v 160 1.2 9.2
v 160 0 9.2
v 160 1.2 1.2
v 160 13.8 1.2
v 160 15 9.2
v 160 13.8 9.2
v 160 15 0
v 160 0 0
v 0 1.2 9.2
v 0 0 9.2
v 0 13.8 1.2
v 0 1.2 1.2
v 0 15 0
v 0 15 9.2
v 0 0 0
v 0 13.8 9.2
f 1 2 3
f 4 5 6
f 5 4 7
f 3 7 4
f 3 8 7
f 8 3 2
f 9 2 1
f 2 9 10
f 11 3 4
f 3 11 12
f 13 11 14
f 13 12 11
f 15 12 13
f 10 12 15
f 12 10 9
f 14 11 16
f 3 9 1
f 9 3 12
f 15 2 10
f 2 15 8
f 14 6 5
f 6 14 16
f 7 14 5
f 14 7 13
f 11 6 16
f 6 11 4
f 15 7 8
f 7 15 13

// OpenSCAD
// ScienceClaw nominal U-channel. All dimensions in millimeters.
// Clamp the first clamp_length along x. No holes or clamp reinforcement.
// Print parameters, layer orientation, material batch, and actual dimensions
// must be recorded separately; this file does not prescribe a qualified process.
length = 160;
clamp_length = 25;
base_width = 15;
wall_height = 8;
thickness = 1.2;
assert(length > clamp_length && clamp_length > 0);
assert(base_width > 2 * thickness && thickness > 0 && wall_height >= 0);
union() {
    cube([length, base_width, thickness]);
    if (wall_height > 0) {
        translate([0, 0, thickness]) cube([length, thickness, wall_height]);
        translate([0, base_width - thickness, thickness]) cube([length, thickness, wall_height]);
    }
}
